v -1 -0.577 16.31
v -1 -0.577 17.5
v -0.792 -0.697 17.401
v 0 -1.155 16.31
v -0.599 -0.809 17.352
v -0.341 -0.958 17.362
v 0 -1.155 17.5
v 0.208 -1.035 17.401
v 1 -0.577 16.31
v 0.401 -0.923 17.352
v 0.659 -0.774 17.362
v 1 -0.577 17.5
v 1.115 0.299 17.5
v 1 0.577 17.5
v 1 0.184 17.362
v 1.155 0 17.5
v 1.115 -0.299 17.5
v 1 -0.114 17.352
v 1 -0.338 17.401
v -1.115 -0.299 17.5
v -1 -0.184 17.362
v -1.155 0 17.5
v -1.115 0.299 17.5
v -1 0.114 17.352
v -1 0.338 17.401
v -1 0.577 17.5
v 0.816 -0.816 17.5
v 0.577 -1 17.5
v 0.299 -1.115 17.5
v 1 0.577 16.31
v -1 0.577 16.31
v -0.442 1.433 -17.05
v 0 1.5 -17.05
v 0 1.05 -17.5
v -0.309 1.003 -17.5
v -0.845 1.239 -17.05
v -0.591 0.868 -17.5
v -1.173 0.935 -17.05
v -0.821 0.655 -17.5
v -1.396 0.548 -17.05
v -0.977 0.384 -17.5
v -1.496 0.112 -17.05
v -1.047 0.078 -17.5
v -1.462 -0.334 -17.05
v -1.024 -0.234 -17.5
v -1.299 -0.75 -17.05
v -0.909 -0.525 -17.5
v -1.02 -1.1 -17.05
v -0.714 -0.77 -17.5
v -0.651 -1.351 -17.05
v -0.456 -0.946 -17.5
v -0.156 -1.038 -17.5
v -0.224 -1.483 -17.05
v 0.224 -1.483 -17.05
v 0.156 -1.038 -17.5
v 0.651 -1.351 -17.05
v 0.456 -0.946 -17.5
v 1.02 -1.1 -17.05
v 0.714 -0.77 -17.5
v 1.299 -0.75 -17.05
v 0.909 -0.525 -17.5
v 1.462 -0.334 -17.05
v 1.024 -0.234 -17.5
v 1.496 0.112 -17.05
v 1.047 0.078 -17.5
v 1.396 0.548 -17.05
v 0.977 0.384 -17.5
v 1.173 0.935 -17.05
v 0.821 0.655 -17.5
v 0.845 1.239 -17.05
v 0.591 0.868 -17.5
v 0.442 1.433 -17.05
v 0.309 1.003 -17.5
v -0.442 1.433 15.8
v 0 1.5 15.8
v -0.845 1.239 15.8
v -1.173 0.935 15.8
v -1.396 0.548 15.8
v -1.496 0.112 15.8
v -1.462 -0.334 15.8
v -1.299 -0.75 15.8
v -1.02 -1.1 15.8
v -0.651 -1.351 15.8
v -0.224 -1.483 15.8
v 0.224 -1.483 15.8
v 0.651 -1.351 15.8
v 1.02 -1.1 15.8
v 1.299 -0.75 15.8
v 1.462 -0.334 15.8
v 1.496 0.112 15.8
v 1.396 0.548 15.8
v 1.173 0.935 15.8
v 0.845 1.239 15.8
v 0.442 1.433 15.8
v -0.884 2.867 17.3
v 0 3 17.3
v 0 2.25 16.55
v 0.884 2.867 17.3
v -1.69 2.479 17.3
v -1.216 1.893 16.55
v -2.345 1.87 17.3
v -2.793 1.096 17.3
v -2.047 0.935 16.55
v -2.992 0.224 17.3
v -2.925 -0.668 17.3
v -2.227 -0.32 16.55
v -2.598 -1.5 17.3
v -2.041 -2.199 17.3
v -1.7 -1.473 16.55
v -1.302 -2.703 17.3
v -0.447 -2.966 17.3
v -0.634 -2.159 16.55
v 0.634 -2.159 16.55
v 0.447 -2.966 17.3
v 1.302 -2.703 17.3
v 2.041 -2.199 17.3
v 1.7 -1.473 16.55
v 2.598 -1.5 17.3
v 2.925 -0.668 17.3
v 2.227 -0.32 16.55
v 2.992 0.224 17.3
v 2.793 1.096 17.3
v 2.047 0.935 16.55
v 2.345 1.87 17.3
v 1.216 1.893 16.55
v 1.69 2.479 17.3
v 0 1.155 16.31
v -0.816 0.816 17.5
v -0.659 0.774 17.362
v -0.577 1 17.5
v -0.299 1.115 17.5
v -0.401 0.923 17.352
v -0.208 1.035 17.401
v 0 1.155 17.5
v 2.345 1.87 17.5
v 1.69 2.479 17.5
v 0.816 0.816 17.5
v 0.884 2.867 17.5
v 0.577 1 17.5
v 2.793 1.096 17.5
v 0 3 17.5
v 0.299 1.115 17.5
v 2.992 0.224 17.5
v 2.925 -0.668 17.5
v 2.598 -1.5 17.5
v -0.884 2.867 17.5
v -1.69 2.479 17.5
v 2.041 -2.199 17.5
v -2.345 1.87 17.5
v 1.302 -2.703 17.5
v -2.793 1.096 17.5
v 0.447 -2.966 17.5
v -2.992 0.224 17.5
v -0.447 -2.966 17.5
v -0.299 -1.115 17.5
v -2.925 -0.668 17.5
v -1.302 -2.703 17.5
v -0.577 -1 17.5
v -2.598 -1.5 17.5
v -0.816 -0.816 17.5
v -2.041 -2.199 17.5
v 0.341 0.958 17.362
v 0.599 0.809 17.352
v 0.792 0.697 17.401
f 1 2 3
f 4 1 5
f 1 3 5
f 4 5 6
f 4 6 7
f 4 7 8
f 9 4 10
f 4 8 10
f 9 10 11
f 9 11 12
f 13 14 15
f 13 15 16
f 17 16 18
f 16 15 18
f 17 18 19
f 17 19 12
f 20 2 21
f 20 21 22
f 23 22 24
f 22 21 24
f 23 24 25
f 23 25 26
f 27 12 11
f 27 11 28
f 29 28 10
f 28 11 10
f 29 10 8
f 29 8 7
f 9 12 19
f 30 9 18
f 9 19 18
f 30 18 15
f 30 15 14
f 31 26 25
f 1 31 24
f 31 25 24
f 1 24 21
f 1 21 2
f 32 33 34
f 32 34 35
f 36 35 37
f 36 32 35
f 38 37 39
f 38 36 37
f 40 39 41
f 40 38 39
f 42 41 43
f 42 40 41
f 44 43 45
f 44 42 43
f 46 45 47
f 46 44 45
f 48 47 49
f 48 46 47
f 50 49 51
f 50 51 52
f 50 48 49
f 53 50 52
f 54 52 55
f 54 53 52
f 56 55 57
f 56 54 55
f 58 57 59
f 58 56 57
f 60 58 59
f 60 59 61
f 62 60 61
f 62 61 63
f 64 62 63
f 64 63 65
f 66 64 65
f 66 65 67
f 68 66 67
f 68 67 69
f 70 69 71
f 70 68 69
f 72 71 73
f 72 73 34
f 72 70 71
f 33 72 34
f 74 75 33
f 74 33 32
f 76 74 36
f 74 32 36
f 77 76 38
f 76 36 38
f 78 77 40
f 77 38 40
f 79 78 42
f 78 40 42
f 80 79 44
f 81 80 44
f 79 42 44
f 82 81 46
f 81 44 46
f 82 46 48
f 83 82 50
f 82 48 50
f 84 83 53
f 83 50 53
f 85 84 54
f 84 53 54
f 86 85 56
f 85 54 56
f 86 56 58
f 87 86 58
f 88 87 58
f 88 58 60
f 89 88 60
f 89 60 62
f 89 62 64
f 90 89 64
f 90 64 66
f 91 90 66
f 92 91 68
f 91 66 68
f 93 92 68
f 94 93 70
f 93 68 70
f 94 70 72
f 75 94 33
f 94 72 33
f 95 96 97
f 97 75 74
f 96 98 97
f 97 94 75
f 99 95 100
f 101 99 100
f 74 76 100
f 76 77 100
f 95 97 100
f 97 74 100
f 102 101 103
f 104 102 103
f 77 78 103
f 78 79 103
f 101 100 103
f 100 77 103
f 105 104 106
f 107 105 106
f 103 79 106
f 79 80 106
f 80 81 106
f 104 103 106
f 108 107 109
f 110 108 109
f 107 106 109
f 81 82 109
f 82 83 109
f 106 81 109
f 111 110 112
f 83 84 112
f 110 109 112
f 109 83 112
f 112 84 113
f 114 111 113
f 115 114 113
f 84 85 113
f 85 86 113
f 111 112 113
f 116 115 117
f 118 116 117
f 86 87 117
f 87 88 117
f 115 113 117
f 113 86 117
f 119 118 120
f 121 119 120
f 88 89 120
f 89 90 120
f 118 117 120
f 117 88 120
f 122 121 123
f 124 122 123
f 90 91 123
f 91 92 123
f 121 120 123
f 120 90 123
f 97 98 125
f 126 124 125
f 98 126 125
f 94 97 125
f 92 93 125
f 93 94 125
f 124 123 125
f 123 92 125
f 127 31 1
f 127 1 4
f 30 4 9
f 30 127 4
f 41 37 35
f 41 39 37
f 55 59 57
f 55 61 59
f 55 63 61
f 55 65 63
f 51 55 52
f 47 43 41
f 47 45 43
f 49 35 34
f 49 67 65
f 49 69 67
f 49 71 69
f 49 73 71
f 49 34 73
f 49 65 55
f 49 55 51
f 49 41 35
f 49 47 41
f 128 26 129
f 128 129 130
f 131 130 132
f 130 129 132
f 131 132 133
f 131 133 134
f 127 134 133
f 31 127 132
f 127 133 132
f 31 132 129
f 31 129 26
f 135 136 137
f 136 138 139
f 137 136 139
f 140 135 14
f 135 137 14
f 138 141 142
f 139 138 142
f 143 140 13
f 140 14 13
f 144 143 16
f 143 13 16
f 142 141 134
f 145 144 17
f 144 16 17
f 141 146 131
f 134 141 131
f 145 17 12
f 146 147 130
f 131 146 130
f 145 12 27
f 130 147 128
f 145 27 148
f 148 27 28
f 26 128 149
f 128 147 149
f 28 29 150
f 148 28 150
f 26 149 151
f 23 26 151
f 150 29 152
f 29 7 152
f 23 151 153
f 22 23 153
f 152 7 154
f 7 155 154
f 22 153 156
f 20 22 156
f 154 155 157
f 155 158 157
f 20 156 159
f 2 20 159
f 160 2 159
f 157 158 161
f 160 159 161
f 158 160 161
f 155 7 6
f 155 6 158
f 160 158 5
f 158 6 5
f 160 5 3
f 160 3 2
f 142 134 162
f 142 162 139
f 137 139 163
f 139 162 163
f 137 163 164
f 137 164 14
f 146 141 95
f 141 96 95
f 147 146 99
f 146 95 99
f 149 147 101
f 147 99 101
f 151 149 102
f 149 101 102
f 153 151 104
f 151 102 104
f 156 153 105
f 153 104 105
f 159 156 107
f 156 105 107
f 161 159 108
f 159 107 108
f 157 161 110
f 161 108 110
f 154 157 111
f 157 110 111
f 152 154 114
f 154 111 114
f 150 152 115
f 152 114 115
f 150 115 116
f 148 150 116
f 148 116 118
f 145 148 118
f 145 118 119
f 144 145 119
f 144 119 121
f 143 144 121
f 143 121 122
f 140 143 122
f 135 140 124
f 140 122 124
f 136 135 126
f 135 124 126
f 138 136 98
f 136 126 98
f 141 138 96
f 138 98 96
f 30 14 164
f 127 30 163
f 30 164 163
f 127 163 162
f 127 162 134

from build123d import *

# Parameters (mm, degrees)
SKETCH3_W          = 35
SKETCH3_H          = 1.5
CHAMFER1_SIZE      = 0.45
CUT_EXTRUDE1_DEPTH = 1.19


with BuildPart() as part:
    # Sketch3 → Revolve1 (revolve)
    with BuildSketch(Plane(origin=(0, 0, 0), x_dir=(0, 0, -1), z_dir=(1, 0, 0))):
        with Locations((0, 0.75)):
            Rectangle(SKETCH3_W, SKETCH3_H)
    revolve(axis=Axis((0, 0, -17.5), (0, 0, 1)))

    # Chamfer1
    chamfer1_edges = [part.edges().sort_by_distance(p)[0] for p in [
        (0, -1.5, -17.5),
    ]]
    chamfer(chamfer1_edges, length=CHAMFER1_SIZE)

    # Sketch6 → Revolve2 (revolve)
    with BuildSketch(Plane(origin=(0, 0, 0), x_dir=(0, 0, -1), z_dir=(1, 0, 0))):
        Polygon((-17.5, 3), (-17.3, 3), (-15.8, 1.5), (-15.8, 0), (-17.5, 0), align=None)
    revolve(axis=Axis((0, 0, -17.5), (0, 0, 1)))

    # Sketch8 → Cut-Extrude1 (cut)
    with BuildSketch(Plane.XY.offset(17.5)):
        Polygon((0, 1.154700538), (-1, 0.577350269), (-1, -0.577350269), (0, -1.154700538), (1, -0.577350269), (1, 0.577350269), align=None)
    extrude(amount=-CUT_EXTRUDE1_DEPTH, mode=Mode.SUBTRACT)

    # Cut-Extrude2 cone 1 section (through the dimple's axis) → Cut-Extrude2 (revolve, cut)
    with BuildSketch(Plane(origin=(0, 0, 17.5), x_dir=(0, -1, 0), z_dir=(1, 0, 0))):
        Polygon((0, 0), (1.154700538, 0), (0, 1.154700538), align=None)
    revolve(axis=Axis((0, 0, 17.5), (0, 0, -1)), mode=Mode.SUBTRACT)


solid = part.part
